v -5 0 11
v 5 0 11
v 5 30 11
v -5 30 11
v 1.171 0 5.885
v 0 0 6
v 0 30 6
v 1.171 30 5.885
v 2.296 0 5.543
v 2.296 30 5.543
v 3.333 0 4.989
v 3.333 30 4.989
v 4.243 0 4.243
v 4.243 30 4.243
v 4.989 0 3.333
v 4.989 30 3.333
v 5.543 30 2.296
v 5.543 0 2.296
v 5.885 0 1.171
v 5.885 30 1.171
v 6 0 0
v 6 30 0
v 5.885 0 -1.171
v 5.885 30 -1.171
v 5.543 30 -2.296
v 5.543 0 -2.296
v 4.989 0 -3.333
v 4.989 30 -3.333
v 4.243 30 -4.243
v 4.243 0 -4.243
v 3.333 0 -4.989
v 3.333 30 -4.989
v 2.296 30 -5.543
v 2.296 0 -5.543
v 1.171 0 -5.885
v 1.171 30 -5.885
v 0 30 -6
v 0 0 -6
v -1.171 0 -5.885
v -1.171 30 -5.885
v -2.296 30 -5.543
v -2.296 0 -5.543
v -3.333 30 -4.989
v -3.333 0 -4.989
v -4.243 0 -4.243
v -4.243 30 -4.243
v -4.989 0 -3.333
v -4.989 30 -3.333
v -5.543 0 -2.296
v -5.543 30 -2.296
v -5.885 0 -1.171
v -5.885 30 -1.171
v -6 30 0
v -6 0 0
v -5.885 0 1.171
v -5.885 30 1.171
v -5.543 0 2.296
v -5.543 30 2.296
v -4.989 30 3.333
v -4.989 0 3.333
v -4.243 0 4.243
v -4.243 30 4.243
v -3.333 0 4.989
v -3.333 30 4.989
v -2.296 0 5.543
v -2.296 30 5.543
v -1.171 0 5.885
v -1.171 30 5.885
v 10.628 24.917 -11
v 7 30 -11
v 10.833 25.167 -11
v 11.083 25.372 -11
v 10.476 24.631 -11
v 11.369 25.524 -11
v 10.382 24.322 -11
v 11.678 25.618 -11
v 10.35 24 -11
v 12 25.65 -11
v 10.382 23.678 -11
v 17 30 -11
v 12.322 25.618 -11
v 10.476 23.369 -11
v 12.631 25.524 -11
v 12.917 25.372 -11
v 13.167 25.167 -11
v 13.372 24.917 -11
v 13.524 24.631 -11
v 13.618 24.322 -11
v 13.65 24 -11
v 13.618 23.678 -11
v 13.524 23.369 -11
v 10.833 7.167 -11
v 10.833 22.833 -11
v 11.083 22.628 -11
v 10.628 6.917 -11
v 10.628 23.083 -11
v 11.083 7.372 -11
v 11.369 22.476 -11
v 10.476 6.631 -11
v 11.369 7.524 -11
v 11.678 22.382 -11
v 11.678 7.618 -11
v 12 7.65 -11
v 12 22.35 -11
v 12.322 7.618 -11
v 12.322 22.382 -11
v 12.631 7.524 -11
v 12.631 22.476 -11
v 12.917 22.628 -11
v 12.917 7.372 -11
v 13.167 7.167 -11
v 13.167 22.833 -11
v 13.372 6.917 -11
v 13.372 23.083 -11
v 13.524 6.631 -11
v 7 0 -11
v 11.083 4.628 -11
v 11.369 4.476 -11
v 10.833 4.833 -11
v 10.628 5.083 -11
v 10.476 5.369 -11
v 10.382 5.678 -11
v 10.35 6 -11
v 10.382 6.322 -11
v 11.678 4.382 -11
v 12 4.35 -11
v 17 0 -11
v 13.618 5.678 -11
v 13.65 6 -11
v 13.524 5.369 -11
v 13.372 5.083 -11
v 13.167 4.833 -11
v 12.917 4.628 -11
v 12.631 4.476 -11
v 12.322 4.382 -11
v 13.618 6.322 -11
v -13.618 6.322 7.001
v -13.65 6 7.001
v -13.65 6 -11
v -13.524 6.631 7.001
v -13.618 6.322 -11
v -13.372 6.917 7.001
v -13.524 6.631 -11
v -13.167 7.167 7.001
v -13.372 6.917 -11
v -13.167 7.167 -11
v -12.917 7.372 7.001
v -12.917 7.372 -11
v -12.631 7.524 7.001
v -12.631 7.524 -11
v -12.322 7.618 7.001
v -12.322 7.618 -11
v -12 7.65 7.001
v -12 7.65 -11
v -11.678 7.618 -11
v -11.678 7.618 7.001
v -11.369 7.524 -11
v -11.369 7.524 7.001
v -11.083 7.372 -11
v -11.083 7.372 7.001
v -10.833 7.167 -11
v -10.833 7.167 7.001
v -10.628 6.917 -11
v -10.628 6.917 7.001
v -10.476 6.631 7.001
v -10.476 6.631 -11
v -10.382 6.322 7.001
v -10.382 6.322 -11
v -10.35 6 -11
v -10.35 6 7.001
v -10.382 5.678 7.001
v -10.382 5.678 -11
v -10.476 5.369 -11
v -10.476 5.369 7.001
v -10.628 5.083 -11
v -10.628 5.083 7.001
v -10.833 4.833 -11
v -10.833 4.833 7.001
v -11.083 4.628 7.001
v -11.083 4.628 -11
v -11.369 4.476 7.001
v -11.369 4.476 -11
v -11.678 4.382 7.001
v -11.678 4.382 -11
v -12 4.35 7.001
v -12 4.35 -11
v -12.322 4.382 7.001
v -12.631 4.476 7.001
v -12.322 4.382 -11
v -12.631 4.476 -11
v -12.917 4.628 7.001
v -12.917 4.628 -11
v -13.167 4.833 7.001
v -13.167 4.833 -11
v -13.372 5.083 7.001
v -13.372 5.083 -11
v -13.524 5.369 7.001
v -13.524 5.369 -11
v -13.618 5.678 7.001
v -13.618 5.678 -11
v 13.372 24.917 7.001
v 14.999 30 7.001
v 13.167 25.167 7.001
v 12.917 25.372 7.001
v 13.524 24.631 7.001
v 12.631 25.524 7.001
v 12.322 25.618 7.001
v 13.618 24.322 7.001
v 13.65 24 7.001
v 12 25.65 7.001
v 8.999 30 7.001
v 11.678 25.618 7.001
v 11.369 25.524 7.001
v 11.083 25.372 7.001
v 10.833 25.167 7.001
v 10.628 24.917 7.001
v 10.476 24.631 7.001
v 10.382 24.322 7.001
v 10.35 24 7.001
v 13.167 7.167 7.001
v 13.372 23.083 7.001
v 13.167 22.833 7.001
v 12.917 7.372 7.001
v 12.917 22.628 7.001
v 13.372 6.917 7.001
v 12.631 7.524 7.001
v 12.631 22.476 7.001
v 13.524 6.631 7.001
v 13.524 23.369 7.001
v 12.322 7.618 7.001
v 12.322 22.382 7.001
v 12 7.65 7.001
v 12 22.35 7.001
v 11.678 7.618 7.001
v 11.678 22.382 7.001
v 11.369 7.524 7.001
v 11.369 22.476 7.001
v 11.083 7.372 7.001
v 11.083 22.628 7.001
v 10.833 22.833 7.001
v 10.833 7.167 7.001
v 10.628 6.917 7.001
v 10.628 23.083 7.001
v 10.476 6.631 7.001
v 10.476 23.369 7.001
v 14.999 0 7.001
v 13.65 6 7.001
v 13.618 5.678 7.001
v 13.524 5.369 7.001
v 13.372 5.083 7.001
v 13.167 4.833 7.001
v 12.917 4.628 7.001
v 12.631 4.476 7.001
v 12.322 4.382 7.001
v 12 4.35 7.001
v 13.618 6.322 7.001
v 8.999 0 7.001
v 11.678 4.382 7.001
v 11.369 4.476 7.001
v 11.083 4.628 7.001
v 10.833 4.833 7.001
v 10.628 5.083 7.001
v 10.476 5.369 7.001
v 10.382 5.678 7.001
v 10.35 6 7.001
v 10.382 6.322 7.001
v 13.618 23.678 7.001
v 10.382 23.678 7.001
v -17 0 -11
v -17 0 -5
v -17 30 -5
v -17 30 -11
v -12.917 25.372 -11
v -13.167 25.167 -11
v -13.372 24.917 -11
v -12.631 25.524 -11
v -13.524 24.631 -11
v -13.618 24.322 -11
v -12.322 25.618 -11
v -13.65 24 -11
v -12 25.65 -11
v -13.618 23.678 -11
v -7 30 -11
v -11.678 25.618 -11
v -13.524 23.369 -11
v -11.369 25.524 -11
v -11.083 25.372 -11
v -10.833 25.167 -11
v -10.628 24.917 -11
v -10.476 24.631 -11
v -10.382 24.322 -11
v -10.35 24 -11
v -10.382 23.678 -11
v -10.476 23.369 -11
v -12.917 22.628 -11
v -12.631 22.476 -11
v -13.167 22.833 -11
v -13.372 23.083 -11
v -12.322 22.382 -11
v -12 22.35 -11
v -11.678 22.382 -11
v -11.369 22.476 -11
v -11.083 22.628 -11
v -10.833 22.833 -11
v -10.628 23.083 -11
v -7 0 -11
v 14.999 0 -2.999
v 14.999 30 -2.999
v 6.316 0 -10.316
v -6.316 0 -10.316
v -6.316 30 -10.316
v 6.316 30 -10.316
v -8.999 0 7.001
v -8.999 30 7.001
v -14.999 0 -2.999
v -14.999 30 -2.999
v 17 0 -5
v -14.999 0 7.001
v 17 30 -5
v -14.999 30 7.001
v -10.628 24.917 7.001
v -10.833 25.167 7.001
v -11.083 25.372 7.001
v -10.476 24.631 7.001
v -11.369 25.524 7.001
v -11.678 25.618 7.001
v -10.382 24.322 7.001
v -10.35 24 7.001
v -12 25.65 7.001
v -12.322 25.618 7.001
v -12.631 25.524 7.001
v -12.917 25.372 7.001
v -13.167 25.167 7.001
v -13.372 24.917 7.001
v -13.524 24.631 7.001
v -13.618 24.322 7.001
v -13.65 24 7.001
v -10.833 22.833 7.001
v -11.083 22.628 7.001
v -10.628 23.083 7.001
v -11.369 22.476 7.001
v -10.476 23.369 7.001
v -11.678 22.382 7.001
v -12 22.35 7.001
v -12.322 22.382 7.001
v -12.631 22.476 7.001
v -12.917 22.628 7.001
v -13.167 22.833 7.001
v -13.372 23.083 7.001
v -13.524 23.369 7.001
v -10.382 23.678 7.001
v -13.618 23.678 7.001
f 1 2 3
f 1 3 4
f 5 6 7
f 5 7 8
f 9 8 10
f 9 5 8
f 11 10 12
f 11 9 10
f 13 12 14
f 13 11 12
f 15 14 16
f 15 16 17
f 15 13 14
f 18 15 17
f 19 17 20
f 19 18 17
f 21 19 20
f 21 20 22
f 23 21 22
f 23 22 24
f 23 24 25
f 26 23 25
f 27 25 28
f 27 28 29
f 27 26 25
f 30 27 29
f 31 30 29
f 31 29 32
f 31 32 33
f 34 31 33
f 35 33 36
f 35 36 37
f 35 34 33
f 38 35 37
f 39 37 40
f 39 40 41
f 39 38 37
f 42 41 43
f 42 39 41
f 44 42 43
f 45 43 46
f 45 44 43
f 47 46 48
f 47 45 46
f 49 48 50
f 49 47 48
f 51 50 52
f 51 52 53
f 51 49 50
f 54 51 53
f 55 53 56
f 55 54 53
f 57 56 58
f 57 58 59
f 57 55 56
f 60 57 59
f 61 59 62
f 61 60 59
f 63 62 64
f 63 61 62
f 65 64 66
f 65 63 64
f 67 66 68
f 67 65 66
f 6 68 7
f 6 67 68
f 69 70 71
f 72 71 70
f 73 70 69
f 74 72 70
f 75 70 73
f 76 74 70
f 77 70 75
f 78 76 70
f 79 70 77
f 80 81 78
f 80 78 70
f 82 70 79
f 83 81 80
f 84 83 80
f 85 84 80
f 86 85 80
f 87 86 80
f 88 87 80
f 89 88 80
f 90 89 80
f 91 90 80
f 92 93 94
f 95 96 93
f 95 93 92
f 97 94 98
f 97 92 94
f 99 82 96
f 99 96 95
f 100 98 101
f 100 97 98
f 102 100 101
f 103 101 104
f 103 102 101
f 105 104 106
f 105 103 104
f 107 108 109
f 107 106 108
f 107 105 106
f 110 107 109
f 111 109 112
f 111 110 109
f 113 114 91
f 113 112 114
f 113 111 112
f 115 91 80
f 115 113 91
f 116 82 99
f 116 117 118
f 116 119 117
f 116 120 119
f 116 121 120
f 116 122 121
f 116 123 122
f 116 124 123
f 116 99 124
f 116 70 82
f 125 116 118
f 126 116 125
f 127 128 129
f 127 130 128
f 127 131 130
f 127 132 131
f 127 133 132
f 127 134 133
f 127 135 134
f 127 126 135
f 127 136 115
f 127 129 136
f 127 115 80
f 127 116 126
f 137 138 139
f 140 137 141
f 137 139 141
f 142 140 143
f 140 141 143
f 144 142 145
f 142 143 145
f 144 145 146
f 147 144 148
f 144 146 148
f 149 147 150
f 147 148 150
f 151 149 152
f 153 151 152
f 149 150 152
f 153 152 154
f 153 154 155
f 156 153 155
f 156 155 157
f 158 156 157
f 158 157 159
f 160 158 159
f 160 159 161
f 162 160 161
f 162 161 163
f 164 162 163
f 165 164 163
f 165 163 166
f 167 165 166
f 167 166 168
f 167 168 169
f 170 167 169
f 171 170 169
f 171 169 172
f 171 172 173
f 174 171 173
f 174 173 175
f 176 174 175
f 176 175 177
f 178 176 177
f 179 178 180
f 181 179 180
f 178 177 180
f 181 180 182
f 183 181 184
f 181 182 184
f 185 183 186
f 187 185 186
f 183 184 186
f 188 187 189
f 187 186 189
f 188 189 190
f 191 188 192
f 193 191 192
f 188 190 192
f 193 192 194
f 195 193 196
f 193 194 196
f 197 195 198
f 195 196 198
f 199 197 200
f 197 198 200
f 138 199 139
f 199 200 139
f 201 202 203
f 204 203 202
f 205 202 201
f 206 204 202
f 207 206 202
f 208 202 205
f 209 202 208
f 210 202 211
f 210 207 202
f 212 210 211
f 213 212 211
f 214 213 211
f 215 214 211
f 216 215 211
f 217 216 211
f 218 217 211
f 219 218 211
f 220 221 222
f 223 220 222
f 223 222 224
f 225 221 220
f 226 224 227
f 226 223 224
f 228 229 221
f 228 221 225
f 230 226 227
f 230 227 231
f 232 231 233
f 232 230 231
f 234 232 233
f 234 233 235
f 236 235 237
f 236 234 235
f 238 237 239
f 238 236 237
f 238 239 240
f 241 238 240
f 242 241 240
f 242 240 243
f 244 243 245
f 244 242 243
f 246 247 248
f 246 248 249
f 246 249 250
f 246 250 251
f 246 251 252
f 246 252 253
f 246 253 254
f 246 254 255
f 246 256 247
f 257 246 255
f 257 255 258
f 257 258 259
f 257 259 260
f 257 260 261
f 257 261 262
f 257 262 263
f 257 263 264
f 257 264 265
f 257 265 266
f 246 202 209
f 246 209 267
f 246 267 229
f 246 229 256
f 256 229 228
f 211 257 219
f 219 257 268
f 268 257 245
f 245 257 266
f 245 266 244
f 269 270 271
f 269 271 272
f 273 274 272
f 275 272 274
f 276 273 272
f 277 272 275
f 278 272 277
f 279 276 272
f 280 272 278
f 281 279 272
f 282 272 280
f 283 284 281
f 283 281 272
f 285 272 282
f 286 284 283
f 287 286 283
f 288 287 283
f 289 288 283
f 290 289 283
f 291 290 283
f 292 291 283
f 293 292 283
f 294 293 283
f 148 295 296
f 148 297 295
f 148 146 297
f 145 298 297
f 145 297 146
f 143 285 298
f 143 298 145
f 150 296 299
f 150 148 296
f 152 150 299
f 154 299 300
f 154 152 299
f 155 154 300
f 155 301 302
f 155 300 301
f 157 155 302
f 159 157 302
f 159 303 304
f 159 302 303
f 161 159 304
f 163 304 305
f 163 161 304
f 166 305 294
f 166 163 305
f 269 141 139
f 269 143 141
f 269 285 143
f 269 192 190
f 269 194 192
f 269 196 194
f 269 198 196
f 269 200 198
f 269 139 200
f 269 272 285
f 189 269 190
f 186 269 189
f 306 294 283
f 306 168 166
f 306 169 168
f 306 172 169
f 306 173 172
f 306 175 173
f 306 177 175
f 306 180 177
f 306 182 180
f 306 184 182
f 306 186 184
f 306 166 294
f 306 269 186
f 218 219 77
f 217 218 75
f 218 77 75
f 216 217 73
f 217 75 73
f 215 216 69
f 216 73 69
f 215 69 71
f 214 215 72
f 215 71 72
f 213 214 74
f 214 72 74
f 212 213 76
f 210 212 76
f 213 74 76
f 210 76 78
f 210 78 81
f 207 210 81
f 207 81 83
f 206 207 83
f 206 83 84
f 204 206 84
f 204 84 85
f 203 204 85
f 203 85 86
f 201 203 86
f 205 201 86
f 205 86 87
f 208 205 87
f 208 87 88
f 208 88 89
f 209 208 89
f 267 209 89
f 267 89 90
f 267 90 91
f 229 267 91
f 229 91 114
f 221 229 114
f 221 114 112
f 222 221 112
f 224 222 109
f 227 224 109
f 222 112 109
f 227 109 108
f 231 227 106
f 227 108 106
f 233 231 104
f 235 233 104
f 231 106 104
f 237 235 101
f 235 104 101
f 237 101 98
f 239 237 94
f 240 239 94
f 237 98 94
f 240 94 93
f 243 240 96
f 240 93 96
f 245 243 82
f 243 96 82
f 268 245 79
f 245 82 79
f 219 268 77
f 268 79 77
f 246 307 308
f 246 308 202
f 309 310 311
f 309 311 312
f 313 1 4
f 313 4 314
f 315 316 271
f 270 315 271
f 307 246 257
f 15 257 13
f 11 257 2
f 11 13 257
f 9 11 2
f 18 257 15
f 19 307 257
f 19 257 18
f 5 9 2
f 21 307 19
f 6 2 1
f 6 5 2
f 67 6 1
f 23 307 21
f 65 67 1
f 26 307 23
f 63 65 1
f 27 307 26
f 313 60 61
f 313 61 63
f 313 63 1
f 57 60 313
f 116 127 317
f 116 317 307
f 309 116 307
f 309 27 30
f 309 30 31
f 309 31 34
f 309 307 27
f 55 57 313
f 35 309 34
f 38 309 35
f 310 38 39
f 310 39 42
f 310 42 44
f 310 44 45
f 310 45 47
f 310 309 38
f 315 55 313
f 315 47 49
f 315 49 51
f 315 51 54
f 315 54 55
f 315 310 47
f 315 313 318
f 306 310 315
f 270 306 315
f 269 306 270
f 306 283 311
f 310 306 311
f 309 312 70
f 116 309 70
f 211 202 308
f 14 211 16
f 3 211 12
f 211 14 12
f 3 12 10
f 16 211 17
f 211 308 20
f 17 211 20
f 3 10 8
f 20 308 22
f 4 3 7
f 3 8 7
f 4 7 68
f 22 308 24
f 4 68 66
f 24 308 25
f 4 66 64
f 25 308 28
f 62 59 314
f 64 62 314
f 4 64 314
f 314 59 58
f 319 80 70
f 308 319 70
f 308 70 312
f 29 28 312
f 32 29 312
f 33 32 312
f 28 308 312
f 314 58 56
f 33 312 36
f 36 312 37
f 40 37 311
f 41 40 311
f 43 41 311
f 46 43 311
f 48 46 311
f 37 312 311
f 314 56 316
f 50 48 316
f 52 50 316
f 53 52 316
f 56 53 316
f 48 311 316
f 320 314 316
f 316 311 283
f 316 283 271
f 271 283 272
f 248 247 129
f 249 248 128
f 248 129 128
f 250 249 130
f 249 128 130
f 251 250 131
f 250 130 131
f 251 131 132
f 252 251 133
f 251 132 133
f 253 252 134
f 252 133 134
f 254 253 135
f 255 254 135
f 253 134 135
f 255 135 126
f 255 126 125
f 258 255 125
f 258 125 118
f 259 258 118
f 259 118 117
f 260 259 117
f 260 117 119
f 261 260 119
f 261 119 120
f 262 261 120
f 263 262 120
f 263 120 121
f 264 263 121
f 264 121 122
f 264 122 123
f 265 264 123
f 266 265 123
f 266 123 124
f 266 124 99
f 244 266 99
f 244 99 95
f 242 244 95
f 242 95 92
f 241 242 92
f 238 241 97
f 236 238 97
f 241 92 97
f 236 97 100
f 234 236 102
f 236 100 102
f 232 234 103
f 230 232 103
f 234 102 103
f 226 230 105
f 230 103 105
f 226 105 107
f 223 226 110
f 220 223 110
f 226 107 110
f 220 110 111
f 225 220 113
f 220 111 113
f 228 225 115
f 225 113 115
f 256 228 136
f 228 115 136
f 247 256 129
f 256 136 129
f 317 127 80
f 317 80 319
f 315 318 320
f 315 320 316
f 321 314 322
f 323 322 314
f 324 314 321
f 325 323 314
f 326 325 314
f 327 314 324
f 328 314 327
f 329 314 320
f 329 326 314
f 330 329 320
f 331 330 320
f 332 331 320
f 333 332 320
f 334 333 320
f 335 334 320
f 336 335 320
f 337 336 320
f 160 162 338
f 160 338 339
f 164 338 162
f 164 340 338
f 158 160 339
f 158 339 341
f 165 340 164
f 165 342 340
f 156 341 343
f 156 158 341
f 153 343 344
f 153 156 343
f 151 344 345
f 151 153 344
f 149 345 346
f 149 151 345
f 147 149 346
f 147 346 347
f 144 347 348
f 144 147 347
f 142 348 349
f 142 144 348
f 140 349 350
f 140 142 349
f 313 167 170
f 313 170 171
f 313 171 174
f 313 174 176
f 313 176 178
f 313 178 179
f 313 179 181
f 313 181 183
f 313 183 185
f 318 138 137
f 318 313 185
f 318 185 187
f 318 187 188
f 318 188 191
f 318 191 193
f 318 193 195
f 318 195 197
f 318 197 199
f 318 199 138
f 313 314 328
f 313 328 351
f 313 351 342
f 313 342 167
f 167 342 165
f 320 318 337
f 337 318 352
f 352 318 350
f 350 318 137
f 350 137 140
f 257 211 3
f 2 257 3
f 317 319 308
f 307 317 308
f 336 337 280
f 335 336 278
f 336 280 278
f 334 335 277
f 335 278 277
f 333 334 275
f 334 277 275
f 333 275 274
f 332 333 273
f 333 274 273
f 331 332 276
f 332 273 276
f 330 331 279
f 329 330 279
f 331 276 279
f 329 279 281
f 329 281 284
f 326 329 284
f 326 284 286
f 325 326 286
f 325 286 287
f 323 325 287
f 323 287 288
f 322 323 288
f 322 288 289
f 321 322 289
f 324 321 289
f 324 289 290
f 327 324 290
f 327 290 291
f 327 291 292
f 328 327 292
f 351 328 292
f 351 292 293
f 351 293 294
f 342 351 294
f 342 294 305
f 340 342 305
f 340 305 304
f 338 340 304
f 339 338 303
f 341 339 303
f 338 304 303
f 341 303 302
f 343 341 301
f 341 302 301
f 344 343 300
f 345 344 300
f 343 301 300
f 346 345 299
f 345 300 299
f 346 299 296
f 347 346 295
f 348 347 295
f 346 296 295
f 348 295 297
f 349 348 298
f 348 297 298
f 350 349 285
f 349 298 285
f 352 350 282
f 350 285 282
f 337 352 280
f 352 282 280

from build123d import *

# Parameters (mm, degrees)
SKETCH1_R           = 6
BOSS_EXTRUDE1_DEPTH = 30
SKETCH2_R           = 1.65
CUT_EXTRUDE1_DEPTH  = 41.902322672
CUT_EXTRUDE2_DEPTH  = 37.193922142


with BuildPart() as part:
    # Sketch1 → Boss-Extrude1 (new body)
    with BuildSketch(Plane(origin=(0, 0, 0), x_dir=(1, 0, 0), z_dir=(0, 1, 0))):
        Polygon((17, 11), (17, 5), (14.998887809, 2.998887809), (14.998887809, -7.001112191), (8.998887809, -7.001112191), (5, -11), (-5, -11), (-8.998887809, -7.001112191), (-14.998887809, -7.001112191), (-14.998887809, 2.998887809), (-17, 5), (-17, 11), align=None)
        with Locations(Location((0, 0, 0), (0, 0, 270))):
            Circle(SKETCH1_R, mode=Mode.SUBTRACT)
    extrude(amount=BOSS_EXTRUDE1_DEPTH)

    # Sketch2 → Cut-Extrude1 (cut, through all)
    with BuildSketch(Plane(origin=(0, 0, -11), x_dir=(-1, 0, 0), z_dir=(0, 0, -1))):
        with Locations((12, 6)):
            Circle(SKETCH2_R)
        with Locations(Location((-12, 6, 0), (0, 0, 180))):
            Circle(SKETCH2_R)
        with Locations((12, 24)):
            Circle(SKETCH2_R)
        with Locations((-12, 24)):
            Circle(SKETCH2_R)
    extrude(amount=-CUT_EXTRUDE1_DEPTH, mode=Mode.SUBTRACT)

    # Sketch3 → Cut-Extrude2 (cut, through all)
    with BuildSketch(Plane.XZ):
        Polygon((-6.31588303, -10.31588303), (6.31588303, -10.31588303), (7, -11), (-7, -11), align=None)
    extrude(amount=-CUT_EXTRUDE2_DEPTH, mode=Mode.SUBTRACT)


solid = part.part
